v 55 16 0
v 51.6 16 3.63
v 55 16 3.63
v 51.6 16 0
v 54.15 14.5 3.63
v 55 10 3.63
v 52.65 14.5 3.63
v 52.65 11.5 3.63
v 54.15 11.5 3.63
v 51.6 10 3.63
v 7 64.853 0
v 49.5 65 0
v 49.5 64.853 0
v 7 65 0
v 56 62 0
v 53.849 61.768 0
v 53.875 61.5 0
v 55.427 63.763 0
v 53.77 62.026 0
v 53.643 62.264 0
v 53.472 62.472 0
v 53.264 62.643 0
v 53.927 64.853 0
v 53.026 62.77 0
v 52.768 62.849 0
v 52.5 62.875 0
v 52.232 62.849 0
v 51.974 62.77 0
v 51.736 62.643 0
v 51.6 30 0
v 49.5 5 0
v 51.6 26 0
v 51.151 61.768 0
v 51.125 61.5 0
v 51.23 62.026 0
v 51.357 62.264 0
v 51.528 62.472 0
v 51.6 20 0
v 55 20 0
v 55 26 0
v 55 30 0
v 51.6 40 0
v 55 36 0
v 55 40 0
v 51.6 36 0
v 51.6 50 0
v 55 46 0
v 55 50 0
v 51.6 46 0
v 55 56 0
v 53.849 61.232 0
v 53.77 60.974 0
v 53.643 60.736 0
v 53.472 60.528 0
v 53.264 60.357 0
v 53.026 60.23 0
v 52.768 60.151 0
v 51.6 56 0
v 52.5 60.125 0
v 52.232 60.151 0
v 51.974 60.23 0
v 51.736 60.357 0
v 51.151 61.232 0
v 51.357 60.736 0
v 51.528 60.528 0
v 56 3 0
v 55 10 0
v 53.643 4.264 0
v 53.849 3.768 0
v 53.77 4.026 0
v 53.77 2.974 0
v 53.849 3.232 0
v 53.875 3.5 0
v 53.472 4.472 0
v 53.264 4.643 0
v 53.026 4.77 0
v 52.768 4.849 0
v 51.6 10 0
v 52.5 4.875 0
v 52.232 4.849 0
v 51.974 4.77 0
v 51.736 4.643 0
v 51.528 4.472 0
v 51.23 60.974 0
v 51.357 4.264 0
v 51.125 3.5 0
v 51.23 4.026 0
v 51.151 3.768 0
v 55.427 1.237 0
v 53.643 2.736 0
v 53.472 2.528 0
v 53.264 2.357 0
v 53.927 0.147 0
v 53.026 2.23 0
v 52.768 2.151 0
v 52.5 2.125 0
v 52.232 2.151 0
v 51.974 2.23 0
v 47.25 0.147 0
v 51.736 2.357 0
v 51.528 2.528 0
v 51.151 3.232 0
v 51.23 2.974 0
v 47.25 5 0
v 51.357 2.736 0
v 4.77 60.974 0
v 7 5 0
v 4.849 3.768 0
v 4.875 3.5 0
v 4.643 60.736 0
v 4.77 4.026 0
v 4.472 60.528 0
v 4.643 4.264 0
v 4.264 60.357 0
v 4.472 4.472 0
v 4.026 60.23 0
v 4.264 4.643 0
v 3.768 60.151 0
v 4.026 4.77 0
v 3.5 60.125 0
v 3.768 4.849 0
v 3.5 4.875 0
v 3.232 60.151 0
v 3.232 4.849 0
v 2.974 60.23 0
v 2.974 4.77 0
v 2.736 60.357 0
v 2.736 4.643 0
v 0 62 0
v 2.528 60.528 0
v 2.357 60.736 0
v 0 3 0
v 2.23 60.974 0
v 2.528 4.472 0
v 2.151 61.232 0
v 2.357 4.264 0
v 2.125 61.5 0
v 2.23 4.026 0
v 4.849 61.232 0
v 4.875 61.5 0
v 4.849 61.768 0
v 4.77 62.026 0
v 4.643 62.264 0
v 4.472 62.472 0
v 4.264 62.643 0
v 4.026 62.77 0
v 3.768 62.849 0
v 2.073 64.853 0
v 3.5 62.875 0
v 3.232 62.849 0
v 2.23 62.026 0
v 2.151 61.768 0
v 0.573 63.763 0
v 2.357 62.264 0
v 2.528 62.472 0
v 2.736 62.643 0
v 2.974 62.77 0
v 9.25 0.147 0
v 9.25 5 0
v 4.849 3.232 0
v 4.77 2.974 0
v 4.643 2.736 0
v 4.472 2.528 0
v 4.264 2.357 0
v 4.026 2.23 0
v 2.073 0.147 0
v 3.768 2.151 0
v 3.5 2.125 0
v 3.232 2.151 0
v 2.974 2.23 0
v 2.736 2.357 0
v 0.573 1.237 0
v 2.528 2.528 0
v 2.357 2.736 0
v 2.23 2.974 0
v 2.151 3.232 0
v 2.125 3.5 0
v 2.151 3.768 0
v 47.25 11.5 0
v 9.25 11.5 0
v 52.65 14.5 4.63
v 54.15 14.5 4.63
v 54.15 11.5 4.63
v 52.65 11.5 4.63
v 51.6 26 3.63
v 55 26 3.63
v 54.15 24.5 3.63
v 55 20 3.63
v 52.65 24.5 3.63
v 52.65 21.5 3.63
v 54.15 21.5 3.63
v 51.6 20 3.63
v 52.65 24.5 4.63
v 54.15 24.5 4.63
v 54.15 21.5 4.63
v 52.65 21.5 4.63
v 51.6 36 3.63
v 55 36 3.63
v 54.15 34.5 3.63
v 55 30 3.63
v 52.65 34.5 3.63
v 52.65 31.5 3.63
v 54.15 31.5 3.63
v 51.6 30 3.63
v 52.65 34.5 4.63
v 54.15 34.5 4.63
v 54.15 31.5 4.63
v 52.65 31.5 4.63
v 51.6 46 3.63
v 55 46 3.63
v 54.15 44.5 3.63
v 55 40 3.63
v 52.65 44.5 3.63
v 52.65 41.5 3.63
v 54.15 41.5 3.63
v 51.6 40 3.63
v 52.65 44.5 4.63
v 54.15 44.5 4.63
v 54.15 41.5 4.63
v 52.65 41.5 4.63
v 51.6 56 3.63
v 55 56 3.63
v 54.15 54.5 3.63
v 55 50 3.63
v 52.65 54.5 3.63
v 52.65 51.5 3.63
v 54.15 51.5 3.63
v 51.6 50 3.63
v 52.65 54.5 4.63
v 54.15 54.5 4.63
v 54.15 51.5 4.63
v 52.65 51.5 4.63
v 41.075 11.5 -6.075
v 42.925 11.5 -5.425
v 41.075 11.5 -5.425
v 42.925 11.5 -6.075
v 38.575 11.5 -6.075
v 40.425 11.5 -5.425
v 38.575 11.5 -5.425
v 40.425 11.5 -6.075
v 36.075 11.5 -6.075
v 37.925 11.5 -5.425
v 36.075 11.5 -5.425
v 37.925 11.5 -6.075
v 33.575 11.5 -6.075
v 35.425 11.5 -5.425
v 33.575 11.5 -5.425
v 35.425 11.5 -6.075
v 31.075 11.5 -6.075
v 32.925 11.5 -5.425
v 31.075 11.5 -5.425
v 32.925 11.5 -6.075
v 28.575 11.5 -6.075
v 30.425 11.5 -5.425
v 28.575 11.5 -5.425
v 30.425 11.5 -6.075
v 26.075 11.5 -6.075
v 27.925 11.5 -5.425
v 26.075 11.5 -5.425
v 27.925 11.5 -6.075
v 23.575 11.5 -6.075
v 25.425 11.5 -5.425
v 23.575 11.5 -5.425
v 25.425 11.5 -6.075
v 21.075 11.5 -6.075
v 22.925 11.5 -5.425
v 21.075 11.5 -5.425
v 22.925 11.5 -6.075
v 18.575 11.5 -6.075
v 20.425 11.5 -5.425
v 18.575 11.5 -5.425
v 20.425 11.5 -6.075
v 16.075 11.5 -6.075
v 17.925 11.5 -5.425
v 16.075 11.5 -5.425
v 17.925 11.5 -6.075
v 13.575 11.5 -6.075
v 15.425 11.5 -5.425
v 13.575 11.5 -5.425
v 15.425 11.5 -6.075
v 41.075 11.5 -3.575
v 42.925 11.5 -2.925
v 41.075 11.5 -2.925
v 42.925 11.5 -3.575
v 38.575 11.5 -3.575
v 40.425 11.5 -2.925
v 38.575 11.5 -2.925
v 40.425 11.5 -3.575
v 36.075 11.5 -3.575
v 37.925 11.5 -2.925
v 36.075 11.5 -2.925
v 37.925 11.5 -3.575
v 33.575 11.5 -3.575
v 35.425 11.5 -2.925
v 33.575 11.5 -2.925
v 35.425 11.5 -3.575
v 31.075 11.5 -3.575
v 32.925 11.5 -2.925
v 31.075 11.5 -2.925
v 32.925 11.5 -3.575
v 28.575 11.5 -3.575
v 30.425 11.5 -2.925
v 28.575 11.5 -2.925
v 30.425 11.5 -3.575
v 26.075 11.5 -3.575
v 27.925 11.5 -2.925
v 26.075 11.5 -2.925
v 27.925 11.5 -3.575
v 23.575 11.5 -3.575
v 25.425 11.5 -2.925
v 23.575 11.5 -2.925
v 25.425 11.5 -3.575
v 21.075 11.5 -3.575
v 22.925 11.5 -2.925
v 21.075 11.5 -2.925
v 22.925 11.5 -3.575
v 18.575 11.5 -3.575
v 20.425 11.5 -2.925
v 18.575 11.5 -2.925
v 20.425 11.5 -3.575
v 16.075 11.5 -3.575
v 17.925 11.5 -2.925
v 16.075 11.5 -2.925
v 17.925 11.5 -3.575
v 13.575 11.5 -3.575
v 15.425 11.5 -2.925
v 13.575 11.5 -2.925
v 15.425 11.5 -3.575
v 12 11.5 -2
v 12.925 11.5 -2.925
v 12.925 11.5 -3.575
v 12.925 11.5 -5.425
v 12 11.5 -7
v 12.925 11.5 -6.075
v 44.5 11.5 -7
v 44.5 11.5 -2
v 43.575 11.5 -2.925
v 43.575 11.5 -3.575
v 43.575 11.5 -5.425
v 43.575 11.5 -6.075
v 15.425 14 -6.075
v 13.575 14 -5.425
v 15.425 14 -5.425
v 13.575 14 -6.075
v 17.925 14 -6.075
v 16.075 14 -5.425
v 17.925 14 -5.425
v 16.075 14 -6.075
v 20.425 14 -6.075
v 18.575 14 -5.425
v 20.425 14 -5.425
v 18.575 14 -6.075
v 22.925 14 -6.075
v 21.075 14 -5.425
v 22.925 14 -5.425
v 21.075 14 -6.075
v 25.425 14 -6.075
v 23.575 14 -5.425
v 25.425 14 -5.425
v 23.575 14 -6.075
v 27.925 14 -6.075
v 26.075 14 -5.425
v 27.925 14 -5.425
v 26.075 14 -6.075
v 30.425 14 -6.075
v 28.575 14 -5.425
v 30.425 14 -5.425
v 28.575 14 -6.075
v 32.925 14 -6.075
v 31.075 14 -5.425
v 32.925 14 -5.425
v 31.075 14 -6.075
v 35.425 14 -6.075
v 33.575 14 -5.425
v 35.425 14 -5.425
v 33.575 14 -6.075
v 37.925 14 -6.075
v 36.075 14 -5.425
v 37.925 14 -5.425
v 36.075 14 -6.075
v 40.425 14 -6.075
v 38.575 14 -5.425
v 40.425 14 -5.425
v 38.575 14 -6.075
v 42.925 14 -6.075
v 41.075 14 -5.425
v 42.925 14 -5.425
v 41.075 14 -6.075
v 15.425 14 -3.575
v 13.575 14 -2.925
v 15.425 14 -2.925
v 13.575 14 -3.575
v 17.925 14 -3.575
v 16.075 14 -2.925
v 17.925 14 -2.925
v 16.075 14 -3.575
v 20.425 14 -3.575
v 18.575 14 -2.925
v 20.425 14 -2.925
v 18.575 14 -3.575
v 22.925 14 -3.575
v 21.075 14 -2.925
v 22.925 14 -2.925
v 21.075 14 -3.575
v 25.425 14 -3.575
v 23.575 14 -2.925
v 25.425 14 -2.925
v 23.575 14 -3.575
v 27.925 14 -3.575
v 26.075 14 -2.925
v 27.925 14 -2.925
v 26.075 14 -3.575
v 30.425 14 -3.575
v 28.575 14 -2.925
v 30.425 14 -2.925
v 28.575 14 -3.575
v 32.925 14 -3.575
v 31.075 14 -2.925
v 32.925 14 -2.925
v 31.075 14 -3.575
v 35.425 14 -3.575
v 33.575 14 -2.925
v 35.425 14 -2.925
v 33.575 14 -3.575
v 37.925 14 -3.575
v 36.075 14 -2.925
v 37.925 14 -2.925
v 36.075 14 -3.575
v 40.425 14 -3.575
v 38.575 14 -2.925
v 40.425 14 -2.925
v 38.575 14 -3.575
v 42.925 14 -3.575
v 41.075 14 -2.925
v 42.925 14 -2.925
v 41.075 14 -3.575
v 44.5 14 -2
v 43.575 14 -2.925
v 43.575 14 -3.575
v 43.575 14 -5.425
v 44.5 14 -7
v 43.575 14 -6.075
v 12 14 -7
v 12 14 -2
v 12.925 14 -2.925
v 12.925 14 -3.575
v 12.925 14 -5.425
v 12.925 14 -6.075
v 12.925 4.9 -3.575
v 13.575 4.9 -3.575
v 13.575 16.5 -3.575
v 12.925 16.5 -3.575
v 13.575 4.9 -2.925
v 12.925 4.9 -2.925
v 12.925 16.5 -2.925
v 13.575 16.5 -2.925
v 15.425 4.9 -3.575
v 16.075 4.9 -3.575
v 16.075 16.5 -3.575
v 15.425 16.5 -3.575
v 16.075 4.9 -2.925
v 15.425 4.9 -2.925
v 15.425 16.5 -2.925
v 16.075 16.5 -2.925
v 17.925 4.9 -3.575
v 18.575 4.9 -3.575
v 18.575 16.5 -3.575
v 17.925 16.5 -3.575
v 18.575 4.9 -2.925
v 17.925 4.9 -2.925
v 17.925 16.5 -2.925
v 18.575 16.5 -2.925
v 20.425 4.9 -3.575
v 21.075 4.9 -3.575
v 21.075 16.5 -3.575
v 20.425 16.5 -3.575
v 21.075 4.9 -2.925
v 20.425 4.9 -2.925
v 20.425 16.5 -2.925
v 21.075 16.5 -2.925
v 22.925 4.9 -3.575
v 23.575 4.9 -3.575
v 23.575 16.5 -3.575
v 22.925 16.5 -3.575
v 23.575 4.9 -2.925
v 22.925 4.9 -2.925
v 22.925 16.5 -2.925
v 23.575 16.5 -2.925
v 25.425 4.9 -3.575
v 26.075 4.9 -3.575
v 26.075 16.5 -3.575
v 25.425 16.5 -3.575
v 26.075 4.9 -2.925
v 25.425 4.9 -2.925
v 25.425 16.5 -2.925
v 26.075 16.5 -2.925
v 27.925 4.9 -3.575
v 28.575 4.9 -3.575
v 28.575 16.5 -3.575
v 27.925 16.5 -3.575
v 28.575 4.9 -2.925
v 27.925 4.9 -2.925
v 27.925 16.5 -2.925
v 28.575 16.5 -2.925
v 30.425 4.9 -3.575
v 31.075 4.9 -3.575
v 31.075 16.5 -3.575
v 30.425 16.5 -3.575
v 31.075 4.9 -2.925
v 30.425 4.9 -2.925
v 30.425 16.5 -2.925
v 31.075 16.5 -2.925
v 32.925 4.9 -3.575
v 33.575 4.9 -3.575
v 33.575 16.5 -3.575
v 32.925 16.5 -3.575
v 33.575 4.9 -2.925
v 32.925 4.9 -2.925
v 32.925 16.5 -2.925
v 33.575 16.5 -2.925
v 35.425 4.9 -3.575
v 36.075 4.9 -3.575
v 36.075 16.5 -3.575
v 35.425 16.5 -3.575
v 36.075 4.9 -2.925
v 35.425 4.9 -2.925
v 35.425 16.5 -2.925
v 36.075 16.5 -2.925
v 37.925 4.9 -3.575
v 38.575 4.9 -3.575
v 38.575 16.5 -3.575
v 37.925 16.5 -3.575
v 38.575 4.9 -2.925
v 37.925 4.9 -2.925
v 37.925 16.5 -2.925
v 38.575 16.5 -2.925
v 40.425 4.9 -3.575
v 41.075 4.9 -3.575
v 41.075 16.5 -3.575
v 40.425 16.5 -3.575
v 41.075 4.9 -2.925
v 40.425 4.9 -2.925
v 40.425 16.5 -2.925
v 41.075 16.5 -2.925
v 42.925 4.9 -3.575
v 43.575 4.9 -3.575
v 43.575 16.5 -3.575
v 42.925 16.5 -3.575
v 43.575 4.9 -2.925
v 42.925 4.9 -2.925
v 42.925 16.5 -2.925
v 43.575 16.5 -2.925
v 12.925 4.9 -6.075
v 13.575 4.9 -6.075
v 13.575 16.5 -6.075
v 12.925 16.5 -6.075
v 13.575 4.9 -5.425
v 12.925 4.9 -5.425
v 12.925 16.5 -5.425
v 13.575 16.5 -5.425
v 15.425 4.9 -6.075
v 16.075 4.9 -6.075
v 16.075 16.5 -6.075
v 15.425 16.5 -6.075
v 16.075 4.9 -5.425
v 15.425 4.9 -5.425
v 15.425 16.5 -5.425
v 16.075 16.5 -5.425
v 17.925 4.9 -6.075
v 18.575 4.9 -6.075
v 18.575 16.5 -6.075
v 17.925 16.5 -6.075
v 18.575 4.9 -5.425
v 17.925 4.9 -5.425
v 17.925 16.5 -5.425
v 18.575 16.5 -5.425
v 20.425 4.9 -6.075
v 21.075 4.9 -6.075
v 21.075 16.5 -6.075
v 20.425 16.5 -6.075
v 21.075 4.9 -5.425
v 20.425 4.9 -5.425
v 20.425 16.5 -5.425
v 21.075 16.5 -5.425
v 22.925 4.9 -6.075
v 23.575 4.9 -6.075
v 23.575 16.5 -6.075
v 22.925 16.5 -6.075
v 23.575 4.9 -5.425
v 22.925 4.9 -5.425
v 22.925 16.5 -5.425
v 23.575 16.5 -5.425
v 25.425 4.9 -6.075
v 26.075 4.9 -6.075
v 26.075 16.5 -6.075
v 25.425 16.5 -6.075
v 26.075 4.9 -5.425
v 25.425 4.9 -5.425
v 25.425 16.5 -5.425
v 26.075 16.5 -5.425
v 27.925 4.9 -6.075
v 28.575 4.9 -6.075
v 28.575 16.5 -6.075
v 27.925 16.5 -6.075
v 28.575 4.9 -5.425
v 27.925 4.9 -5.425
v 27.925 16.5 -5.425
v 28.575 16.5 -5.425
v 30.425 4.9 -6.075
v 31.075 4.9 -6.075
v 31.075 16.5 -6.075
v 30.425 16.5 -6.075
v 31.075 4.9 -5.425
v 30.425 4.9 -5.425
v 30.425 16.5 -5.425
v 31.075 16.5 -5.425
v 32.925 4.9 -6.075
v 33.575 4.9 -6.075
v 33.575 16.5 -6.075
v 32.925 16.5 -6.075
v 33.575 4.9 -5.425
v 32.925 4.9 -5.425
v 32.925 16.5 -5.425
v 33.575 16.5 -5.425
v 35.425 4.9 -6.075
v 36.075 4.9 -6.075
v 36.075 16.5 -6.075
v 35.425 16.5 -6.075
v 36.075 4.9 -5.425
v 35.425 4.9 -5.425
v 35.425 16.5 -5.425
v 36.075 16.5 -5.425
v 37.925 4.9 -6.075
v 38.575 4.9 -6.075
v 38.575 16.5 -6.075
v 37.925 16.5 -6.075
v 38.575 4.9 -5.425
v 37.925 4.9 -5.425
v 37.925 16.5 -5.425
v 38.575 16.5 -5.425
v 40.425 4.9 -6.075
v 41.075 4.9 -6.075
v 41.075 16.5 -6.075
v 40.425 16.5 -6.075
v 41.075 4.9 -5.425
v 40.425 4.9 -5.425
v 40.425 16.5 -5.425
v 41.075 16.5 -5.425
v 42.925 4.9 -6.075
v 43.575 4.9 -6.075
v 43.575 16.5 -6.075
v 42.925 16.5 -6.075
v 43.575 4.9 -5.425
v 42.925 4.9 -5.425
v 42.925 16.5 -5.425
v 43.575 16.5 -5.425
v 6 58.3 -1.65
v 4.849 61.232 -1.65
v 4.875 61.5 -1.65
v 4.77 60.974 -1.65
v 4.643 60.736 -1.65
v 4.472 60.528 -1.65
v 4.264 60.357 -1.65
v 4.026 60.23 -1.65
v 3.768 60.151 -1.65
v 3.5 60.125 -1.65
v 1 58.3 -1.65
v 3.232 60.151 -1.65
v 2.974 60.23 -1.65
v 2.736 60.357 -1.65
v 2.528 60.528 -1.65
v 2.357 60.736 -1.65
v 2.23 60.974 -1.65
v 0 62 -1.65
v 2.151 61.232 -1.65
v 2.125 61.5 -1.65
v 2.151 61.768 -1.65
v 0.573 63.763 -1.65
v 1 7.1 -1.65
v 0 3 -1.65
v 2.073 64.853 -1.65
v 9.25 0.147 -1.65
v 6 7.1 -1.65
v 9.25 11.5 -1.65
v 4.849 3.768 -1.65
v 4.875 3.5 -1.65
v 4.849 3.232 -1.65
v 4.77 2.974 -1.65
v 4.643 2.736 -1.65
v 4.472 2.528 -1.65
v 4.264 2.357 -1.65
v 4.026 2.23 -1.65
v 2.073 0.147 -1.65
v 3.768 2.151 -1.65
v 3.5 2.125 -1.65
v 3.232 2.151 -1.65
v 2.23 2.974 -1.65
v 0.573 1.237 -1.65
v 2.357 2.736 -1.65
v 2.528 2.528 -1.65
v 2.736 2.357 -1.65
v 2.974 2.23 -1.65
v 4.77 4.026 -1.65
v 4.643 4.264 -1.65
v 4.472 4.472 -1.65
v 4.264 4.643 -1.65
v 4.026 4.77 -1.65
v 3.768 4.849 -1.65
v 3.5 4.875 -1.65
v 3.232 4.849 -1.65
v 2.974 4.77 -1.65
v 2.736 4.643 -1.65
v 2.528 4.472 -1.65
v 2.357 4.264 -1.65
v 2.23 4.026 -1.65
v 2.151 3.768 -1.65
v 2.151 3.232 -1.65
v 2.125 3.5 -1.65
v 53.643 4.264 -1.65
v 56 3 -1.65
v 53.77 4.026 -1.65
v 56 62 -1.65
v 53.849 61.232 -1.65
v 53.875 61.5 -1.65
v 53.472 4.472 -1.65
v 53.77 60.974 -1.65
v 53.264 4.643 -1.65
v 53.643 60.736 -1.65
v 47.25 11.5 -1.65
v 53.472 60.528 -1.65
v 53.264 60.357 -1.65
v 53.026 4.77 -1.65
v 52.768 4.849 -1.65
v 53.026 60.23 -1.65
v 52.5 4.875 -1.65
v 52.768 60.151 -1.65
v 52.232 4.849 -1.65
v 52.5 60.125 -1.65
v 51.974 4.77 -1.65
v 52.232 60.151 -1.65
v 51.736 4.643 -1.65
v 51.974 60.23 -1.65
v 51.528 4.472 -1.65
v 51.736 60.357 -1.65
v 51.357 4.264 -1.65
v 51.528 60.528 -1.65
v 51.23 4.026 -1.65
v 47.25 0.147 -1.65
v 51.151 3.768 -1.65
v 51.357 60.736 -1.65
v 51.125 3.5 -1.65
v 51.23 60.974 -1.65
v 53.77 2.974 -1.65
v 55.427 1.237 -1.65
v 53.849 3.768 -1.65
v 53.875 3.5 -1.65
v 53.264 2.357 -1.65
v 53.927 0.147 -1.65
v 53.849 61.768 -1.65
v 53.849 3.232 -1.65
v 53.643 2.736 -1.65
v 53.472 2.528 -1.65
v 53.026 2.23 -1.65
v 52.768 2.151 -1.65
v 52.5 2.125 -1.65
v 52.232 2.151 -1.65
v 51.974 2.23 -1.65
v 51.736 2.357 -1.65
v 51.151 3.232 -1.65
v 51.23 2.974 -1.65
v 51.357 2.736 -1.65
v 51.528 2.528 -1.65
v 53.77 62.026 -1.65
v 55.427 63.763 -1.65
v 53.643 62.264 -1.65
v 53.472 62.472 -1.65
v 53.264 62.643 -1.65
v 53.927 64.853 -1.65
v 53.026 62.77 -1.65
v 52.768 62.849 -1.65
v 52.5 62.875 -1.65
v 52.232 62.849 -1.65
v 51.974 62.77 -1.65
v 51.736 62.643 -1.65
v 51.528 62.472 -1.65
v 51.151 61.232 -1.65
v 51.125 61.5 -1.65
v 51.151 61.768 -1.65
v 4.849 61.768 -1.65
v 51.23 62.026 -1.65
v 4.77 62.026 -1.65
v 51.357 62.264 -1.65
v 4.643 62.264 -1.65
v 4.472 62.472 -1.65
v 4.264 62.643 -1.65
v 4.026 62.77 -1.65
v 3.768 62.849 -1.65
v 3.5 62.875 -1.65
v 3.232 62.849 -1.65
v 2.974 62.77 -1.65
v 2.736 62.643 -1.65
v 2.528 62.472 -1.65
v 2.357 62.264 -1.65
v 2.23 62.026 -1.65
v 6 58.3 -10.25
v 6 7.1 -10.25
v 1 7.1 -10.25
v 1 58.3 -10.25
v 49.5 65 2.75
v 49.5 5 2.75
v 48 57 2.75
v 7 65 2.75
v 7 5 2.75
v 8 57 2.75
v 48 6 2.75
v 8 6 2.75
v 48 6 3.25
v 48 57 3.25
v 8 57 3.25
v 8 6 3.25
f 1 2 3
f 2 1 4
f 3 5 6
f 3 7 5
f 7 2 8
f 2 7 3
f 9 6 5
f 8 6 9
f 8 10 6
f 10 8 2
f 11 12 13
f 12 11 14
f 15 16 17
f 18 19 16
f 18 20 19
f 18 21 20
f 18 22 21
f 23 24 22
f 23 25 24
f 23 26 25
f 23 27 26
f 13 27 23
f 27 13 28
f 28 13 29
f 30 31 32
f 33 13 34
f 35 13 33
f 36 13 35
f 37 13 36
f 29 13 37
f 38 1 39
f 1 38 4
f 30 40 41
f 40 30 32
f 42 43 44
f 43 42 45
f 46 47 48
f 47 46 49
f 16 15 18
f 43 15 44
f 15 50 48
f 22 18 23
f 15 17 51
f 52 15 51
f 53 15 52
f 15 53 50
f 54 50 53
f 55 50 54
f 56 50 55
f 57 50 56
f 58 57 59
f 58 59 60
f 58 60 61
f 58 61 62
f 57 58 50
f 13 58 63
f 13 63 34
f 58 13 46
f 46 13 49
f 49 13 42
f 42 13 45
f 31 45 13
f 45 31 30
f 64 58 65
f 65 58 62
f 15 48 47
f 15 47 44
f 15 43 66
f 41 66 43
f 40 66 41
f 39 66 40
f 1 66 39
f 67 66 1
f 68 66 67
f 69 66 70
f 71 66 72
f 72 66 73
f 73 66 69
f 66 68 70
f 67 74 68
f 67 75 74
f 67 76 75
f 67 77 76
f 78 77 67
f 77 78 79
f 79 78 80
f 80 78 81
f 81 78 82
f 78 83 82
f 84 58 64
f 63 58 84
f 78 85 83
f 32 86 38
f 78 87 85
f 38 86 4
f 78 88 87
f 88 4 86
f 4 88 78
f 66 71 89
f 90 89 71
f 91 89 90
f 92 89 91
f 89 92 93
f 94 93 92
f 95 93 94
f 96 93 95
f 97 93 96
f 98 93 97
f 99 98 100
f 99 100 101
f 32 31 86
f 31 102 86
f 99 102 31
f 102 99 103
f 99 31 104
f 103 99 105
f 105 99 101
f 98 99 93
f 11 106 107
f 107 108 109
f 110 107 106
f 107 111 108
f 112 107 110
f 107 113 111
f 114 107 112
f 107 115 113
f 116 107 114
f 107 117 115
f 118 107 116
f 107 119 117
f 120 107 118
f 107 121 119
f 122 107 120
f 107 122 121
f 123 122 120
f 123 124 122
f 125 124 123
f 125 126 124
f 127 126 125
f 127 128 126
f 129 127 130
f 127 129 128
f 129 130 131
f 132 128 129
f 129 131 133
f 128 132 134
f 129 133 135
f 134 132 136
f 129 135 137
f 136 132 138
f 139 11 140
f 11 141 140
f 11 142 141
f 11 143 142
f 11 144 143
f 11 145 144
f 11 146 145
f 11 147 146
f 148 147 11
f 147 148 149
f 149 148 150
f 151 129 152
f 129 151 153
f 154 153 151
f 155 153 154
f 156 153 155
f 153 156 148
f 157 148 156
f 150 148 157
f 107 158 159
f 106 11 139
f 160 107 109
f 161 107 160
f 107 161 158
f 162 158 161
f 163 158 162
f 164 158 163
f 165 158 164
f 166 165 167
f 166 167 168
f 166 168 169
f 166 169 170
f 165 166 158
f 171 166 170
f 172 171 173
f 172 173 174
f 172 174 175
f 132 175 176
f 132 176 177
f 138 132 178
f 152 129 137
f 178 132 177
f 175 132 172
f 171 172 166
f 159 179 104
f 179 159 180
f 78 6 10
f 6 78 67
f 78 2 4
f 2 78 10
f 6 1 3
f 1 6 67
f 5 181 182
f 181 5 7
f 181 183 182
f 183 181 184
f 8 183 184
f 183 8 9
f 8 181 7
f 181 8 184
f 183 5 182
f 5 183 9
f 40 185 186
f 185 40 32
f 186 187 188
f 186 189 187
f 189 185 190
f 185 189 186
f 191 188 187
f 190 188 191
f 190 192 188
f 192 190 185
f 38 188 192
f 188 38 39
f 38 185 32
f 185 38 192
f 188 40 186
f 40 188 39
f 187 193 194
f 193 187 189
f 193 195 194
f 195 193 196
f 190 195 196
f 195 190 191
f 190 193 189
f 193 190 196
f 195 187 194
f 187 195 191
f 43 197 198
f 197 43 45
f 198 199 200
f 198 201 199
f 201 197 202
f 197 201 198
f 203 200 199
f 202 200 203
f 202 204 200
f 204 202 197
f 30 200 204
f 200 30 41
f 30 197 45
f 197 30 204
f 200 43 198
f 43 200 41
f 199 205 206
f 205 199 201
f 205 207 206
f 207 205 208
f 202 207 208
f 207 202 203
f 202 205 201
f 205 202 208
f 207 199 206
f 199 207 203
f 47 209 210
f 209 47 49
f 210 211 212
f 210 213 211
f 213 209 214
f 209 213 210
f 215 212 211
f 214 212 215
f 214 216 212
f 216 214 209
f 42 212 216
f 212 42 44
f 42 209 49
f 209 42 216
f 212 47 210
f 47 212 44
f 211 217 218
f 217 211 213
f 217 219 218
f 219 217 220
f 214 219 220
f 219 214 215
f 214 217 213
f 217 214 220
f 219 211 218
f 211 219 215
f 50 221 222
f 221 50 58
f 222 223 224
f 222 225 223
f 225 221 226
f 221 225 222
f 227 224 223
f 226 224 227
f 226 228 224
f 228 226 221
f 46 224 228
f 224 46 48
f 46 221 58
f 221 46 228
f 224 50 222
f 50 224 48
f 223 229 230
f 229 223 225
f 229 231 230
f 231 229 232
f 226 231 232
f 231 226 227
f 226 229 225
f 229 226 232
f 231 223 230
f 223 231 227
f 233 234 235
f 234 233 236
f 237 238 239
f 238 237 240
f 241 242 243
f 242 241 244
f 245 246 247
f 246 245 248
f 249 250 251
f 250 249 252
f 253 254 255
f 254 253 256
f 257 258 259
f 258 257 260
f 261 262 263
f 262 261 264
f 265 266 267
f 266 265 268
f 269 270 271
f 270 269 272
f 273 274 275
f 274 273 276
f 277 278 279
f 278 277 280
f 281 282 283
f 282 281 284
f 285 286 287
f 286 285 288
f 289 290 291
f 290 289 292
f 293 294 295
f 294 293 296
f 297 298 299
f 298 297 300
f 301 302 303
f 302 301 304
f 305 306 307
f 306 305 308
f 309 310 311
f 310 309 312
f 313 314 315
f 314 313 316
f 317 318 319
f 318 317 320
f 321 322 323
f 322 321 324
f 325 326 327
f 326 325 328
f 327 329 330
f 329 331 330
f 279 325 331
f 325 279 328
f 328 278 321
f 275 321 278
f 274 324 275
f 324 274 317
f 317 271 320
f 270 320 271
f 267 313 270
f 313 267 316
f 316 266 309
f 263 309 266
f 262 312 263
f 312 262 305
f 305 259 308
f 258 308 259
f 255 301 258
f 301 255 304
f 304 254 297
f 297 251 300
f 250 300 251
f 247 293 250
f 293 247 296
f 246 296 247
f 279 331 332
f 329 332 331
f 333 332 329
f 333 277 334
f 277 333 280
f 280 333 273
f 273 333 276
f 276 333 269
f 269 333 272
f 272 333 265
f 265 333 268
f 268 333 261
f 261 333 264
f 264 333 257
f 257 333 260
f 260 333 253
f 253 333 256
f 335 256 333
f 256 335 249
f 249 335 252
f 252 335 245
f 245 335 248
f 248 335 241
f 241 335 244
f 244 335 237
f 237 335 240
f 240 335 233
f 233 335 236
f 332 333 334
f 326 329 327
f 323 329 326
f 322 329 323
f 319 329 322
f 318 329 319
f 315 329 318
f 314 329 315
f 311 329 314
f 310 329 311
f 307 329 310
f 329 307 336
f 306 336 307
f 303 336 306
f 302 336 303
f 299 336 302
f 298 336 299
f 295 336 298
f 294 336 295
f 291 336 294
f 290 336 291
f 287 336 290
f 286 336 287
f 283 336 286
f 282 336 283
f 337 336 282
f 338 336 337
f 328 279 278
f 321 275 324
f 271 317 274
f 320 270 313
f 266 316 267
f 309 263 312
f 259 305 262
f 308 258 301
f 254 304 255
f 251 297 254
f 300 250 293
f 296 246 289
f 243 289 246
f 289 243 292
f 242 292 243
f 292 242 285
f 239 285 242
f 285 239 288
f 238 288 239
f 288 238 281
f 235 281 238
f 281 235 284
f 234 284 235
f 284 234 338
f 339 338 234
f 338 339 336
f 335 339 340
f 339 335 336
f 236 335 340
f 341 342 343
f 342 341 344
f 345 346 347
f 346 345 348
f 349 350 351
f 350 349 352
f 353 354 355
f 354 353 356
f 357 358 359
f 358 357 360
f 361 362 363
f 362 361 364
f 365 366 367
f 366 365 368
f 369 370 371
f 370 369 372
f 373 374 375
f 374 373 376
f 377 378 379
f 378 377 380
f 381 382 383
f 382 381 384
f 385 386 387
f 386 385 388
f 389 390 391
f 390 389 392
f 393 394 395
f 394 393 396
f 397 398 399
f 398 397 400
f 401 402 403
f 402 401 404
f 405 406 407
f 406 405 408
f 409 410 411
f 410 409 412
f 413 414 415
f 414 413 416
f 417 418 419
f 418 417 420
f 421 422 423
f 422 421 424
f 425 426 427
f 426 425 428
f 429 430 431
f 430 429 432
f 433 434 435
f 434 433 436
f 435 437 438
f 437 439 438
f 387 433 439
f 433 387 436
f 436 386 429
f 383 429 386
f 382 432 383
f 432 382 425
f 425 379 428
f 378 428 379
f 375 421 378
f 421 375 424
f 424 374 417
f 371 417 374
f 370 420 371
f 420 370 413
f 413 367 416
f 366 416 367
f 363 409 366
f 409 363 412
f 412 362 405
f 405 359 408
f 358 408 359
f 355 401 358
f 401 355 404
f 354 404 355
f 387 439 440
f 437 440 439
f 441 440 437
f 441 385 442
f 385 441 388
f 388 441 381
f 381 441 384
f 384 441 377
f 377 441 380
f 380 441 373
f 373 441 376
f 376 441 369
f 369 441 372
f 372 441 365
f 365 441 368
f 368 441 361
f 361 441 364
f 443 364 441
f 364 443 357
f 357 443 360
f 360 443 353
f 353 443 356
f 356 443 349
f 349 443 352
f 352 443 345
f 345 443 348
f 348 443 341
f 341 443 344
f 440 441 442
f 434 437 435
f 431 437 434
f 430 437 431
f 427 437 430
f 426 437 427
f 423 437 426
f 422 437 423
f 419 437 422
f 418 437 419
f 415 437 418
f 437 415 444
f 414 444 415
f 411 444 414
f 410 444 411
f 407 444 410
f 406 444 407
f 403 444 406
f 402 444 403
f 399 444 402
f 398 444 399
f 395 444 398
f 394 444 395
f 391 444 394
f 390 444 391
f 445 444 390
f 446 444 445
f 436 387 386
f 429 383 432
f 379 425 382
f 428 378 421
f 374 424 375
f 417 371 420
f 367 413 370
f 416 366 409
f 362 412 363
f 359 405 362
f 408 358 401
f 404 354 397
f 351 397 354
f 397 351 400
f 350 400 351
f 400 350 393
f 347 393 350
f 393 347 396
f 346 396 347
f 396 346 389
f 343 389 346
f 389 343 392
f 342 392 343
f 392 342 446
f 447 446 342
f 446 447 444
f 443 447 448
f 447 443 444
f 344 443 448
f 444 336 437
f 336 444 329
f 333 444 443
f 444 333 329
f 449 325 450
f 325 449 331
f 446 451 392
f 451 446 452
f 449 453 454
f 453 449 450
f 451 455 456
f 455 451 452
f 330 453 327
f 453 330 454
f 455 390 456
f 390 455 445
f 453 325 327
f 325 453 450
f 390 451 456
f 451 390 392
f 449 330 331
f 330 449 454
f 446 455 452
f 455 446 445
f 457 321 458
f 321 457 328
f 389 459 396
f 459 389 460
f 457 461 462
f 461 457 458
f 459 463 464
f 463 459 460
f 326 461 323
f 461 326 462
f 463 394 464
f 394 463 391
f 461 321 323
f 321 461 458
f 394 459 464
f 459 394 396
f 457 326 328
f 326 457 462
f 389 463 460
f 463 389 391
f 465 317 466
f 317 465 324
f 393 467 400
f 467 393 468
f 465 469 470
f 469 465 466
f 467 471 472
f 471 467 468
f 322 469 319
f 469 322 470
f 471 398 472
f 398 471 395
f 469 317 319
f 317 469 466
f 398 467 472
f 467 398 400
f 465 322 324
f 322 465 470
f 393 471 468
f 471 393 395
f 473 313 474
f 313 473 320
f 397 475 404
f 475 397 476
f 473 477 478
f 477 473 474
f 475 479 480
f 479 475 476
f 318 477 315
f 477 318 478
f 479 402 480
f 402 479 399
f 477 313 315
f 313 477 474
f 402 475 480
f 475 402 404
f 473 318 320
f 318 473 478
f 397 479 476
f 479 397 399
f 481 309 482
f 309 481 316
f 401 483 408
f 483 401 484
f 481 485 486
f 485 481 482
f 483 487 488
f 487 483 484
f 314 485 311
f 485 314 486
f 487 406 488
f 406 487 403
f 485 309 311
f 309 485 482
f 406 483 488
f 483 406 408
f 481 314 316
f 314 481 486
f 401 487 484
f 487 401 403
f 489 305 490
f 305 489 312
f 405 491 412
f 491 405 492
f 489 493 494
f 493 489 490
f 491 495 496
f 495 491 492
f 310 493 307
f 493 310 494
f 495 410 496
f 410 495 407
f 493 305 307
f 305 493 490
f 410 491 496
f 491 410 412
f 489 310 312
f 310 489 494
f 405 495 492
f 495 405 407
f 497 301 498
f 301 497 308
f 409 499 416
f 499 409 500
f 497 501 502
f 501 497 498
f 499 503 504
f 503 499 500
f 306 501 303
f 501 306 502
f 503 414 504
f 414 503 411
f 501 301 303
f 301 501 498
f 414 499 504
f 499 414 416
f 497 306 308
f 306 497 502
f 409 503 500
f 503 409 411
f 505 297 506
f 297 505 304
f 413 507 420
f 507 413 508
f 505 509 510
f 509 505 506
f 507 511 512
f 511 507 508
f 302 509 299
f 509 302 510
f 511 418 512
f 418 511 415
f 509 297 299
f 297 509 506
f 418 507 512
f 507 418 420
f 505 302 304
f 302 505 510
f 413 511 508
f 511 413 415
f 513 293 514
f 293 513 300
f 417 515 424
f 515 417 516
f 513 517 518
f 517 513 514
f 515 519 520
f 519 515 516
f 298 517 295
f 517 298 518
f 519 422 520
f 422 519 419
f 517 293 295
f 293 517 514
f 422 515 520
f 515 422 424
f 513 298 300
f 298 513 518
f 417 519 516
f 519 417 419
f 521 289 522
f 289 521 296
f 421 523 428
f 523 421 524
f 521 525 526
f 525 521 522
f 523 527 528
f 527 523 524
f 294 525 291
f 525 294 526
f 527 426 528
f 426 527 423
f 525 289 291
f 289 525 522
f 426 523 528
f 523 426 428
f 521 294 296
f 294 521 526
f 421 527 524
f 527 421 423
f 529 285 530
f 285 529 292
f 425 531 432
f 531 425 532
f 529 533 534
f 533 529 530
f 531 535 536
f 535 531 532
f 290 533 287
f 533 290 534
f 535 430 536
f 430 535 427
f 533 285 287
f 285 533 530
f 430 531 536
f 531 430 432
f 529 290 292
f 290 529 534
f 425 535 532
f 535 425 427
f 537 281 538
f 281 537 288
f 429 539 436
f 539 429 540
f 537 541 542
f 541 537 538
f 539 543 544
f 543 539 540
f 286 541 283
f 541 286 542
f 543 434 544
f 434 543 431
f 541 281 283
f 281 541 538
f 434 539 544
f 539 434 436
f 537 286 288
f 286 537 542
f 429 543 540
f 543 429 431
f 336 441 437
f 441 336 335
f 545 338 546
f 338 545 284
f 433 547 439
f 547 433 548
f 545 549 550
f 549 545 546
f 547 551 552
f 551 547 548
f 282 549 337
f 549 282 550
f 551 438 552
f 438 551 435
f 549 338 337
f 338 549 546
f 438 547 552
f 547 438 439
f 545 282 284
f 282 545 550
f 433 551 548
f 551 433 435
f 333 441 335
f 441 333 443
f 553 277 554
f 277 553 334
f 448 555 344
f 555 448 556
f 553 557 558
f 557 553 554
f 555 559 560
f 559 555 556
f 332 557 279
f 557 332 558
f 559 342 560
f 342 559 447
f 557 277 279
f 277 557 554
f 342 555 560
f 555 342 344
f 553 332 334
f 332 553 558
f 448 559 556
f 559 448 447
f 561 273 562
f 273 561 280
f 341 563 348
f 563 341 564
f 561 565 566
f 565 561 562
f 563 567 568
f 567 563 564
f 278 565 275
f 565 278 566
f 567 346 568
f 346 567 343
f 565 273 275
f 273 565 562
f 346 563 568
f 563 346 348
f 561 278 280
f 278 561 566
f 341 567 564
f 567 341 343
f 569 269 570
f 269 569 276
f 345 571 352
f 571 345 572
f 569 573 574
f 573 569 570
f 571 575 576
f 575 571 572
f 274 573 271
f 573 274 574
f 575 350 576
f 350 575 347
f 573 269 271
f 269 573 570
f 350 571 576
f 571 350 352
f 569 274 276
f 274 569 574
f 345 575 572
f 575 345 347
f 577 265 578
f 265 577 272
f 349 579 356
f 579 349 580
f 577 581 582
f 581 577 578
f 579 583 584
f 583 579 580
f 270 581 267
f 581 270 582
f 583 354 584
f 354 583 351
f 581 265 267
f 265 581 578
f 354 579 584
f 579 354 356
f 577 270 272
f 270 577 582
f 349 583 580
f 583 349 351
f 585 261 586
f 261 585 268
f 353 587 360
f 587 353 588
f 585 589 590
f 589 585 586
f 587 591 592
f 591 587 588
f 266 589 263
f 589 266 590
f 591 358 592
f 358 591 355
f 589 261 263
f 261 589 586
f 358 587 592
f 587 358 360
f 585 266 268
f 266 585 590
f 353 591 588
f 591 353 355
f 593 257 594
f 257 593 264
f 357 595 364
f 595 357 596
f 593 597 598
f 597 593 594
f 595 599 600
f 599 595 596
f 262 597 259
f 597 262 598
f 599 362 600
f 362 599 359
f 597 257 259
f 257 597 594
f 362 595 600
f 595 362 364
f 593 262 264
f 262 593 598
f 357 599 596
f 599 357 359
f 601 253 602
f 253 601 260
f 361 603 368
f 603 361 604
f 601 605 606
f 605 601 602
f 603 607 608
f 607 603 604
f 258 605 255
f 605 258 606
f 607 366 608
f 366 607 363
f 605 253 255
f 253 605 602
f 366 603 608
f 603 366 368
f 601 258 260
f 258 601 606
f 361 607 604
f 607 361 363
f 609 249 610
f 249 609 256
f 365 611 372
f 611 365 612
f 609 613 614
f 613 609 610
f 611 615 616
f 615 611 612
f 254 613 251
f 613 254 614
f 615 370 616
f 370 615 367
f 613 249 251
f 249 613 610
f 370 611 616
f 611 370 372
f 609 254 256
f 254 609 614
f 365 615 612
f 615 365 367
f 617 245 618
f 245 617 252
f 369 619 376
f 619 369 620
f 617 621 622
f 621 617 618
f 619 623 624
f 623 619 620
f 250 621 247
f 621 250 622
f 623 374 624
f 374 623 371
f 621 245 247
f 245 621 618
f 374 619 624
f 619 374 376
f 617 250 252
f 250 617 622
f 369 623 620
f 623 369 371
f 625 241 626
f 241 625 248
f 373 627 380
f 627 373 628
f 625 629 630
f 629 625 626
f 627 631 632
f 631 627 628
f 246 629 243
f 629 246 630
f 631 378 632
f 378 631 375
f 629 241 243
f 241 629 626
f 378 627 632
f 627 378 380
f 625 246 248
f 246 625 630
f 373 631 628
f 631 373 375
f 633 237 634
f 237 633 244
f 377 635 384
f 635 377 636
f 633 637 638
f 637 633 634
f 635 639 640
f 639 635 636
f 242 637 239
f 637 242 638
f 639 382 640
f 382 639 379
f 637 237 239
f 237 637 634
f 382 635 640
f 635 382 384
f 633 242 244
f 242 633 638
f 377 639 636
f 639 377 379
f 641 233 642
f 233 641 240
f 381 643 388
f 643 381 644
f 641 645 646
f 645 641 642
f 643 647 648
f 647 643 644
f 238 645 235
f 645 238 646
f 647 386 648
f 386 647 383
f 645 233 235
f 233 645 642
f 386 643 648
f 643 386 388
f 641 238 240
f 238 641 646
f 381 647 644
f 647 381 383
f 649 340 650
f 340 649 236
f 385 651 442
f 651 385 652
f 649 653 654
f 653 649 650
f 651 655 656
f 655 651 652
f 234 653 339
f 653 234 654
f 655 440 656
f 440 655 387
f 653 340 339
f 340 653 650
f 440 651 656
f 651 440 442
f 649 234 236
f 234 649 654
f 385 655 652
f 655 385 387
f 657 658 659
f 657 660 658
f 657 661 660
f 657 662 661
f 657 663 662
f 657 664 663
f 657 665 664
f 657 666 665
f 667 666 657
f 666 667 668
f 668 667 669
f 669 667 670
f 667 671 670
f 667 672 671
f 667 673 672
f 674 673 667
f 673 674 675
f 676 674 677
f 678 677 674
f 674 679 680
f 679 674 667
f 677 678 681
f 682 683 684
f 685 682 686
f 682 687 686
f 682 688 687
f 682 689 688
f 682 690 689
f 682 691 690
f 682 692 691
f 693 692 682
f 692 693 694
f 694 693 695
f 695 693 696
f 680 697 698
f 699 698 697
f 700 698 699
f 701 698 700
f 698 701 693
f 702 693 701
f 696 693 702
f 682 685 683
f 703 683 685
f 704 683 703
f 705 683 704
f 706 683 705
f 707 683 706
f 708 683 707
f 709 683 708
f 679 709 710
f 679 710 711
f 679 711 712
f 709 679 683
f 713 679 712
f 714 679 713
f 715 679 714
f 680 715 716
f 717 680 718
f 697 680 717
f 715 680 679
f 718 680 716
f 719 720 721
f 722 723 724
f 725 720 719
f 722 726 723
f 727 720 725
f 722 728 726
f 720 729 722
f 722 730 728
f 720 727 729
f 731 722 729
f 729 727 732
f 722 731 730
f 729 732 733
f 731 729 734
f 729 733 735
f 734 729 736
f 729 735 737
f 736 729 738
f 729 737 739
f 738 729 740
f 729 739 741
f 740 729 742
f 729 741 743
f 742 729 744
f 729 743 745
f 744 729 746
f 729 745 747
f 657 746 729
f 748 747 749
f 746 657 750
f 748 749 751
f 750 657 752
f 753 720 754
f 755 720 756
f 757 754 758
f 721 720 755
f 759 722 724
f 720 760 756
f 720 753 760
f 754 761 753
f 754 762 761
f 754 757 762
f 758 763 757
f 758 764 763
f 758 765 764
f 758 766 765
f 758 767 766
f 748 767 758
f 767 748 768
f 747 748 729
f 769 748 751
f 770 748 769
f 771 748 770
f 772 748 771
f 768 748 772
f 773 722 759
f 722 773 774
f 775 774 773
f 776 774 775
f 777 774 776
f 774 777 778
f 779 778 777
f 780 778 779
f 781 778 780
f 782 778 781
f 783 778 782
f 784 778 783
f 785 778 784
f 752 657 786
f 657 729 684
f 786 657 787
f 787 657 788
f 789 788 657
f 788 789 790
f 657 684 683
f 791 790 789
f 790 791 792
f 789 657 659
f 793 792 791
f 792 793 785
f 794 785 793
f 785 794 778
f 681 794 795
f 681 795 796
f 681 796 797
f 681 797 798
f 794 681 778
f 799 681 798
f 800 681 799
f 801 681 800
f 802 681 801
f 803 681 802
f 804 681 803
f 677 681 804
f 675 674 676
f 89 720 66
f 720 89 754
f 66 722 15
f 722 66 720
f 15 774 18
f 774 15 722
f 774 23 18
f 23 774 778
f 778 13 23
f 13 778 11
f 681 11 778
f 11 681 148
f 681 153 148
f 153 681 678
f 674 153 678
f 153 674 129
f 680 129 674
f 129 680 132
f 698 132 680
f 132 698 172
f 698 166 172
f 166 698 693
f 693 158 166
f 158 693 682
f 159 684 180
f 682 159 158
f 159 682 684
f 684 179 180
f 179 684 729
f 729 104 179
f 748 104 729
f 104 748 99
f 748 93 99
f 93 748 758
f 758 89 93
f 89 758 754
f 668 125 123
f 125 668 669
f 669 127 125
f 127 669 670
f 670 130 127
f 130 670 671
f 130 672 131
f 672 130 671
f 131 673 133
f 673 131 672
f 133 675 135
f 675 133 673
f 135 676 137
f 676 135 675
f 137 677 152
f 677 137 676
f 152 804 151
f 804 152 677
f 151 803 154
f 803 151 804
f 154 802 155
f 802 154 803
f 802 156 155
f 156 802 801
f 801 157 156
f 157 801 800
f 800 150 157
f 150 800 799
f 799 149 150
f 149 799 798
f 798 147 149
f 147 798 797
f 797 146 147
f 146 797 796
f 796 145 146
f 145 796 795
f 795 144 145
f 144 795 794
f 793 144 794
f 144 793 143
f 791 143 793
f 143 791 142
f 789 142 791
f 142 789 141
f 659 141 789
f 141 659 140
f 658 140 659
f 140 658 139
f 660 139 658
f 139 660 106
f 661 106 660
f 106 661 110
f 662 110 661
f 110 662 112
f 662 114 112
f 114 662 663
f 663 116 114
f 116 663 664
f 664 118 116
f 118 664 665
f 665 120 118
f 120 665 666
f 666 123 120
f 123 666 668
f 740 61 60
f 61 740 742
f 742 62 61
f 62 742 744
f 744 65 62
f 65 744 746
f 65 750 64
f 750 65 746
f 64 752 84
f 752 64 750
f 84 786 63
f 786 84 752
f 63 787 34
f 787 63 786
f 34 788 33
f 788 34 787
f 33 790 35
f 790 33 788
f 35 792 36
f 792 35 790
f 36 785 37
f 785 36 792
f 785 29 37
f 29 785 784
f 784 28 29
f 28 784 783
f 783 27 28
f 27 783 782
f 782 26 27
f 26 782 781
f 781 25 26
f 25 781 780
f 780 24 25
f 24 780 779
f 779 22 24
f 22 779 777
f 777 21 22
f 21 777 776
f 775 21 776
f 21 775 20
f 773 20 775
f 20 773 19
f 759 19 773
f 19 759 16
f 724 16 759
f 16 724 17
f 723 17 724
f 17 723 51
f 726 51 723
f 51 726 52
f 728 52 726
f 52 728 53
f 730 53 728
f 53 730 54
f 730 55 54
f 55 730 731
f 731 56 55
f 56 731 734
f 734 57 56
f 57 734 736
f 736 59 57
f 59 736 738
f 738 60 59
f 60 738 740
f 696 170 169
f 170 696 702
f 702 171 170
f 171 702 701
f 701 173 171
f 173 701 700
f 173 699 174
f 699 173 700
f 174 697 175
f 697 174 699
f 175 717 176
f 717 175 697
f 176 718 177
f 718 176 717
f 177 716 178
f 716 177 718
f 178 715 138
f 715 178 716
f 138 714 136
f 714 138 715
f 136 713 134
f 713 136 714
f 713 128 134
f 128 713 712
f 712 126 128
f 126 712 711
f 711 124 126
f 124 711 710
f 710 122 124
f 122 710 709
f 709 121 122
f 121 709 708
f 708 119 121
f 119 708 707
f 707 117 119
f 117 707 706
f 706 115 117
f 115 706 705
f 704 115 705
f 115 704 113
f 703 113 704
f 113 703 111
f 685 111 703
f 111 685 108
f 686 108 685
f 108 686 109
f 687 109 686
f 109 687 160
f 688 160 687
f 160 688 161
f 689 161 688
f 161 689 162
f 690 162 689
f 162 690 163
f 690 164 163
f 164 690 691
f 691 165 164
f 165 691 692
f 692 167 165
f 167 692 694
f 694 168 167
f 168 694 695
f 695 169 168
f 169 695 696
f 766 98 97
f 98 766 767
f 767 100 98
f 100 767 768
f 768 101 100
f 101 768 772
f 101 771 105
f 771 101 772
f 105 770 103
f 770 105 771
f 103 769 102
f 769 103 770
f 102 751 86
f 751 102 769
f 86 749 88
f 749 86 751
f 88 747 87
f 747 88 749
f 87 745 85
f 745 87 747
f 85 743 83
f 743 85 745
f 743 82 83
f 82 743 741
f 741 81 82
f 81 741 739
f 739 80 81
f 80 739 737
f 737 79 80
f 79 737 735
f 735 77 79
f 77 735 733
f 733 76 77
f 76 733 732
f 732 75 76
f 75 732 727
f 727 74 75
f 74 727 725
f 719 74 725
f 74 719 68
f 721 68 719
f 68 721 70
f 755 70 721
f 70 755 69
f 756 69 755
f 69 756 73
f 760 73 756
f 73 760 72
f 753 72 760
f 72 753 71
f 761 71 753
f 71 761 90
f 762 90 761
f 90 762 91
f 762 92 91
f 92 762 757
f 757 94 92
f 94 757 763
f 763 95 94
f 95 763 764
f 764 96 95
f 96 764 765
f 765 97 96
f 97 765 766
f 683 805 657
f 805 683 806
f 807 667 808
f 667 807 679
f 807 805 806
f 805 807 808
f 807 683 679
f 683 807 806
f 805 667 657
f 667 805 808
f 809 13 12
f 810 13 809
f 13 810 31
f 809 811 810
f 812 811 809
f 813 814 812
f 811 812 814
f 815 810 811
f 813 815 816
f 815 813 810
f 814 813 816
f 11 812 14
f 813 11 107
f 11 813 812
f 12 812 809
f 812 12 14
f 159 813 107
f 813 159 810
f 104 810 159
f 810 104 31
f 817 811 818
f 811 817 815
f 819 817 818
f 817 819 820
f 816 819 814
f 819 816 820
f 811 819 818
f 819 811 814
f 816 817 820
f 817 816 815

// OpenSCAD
// file: util.scad
module micro_usb() {
    color("grey")
    cube([7.7,5.5,3]);
}

micro_usb();

module header(x_max,y_max) {
    union() {
        for(x=[0:x_max-1]) {
            for(y=[0:y_max-1]) {
                translate([x*2.5,y*2.5]) {
                    color("black")
                        cube([2.5,2.5,2.5]);
                    color("gold")
                        translate([(2.5 - 0.65)/2,(2.5 - 0.65)/2,-2.5])
                        cube([0.65,0.65,11.6]);
                }
            }
        }
    }
}

translate([0,8,0])
    header(2,13);

module sdcard() {

    color("red")
        cube([11,15,0.75]);
}
translate([10,0,0])
    sdcard();

module sdcard_reader() {
    color("grey")
        cube([12,11.65,1.5]);
}
translate([9.5,-0.4,0])
    sdcard_reader();

module hdmi() {
    color("grey")
        cube([11,15,5.6]);

}

translate([30,0,0])
    hdmi();

module usb() {
    color("grey")
    cube([14,14,5.85]);

}

translate([10,20,0])
    usb();

module audio() {
    $fn=30;
    color("black")
        union() {
            cube([7,12.6,6]);
            translate([7/2,14.5,3])
                rotate([90,0,0])
                cylinder(d=6,h=2.5);
        }
}

translate([30,30,0])
    audio();
// main file
use <util.scad>;

width=56;
length=65;
pcb_height=1.65;

module tiny_switch() {
	   color("grey")
		cube([6,3.4,3.63]);
	translate([3,1.6,4.13])
	color("white")
		cube([3,1.5,1], center=true);
}

module pitft_holes() {
	$fn=32;
	translate([3.5,3.5]) circle(d=2.75);
	translate([width - 3.5,3.5]) circle(d=2.75);
	translate([3.5,length - 3.5]) circle(d=2.75);
	translate([width - 3.5,length - 3.5]) circle(d=2.75);
}

module pitft() {
	color("blue")
		translate([0, 0, -pcb_height]) 
		linear_extrude(pcb_height)
		difference() {
			hull() {
				translate([  3,   3]) circle(r=3);
				translate([width-3,   3]) circle(r=3);
				translate([  3, length-3]) circle(r=3);
				translate([width-3, length-3]) circle(r=3);
			}
			pitft_holes();

			// cutout for 26 pin GPIO
			translate([9.25,-1])
				square([38,12.5]);
			
		}
		
		
	  translate([55,10,0])
		rotate(90)
		tiny_switch();
	  
	  translate([55,20,0])
		rotate(90)
		tiny_switch();    
		 translate([55,30,0])
		rotate(90)
		tiny_switch();    
		 translate([55,40,0])
		rotate(90)
		tiny_switch();    
		 translate([55,50,0])
		rotate(90)
		tiny_switch();    
	  
	color("black")
		translate([6.0, 7.1, -pcb_height])
		rotate([0,180,0])
		cube([5, 51.2, 8.6]);
		
	 translate([12.0, 14, -2])
		rotate([0,90,270])
		header(2, 13);
		
	 color("white")
		translate([7,5,0])
		cube([42.5,60,2.75]);
	 color("black")
		translate([8,6,2.75])
		cube([40,51,0.5]);
}


pitft();
